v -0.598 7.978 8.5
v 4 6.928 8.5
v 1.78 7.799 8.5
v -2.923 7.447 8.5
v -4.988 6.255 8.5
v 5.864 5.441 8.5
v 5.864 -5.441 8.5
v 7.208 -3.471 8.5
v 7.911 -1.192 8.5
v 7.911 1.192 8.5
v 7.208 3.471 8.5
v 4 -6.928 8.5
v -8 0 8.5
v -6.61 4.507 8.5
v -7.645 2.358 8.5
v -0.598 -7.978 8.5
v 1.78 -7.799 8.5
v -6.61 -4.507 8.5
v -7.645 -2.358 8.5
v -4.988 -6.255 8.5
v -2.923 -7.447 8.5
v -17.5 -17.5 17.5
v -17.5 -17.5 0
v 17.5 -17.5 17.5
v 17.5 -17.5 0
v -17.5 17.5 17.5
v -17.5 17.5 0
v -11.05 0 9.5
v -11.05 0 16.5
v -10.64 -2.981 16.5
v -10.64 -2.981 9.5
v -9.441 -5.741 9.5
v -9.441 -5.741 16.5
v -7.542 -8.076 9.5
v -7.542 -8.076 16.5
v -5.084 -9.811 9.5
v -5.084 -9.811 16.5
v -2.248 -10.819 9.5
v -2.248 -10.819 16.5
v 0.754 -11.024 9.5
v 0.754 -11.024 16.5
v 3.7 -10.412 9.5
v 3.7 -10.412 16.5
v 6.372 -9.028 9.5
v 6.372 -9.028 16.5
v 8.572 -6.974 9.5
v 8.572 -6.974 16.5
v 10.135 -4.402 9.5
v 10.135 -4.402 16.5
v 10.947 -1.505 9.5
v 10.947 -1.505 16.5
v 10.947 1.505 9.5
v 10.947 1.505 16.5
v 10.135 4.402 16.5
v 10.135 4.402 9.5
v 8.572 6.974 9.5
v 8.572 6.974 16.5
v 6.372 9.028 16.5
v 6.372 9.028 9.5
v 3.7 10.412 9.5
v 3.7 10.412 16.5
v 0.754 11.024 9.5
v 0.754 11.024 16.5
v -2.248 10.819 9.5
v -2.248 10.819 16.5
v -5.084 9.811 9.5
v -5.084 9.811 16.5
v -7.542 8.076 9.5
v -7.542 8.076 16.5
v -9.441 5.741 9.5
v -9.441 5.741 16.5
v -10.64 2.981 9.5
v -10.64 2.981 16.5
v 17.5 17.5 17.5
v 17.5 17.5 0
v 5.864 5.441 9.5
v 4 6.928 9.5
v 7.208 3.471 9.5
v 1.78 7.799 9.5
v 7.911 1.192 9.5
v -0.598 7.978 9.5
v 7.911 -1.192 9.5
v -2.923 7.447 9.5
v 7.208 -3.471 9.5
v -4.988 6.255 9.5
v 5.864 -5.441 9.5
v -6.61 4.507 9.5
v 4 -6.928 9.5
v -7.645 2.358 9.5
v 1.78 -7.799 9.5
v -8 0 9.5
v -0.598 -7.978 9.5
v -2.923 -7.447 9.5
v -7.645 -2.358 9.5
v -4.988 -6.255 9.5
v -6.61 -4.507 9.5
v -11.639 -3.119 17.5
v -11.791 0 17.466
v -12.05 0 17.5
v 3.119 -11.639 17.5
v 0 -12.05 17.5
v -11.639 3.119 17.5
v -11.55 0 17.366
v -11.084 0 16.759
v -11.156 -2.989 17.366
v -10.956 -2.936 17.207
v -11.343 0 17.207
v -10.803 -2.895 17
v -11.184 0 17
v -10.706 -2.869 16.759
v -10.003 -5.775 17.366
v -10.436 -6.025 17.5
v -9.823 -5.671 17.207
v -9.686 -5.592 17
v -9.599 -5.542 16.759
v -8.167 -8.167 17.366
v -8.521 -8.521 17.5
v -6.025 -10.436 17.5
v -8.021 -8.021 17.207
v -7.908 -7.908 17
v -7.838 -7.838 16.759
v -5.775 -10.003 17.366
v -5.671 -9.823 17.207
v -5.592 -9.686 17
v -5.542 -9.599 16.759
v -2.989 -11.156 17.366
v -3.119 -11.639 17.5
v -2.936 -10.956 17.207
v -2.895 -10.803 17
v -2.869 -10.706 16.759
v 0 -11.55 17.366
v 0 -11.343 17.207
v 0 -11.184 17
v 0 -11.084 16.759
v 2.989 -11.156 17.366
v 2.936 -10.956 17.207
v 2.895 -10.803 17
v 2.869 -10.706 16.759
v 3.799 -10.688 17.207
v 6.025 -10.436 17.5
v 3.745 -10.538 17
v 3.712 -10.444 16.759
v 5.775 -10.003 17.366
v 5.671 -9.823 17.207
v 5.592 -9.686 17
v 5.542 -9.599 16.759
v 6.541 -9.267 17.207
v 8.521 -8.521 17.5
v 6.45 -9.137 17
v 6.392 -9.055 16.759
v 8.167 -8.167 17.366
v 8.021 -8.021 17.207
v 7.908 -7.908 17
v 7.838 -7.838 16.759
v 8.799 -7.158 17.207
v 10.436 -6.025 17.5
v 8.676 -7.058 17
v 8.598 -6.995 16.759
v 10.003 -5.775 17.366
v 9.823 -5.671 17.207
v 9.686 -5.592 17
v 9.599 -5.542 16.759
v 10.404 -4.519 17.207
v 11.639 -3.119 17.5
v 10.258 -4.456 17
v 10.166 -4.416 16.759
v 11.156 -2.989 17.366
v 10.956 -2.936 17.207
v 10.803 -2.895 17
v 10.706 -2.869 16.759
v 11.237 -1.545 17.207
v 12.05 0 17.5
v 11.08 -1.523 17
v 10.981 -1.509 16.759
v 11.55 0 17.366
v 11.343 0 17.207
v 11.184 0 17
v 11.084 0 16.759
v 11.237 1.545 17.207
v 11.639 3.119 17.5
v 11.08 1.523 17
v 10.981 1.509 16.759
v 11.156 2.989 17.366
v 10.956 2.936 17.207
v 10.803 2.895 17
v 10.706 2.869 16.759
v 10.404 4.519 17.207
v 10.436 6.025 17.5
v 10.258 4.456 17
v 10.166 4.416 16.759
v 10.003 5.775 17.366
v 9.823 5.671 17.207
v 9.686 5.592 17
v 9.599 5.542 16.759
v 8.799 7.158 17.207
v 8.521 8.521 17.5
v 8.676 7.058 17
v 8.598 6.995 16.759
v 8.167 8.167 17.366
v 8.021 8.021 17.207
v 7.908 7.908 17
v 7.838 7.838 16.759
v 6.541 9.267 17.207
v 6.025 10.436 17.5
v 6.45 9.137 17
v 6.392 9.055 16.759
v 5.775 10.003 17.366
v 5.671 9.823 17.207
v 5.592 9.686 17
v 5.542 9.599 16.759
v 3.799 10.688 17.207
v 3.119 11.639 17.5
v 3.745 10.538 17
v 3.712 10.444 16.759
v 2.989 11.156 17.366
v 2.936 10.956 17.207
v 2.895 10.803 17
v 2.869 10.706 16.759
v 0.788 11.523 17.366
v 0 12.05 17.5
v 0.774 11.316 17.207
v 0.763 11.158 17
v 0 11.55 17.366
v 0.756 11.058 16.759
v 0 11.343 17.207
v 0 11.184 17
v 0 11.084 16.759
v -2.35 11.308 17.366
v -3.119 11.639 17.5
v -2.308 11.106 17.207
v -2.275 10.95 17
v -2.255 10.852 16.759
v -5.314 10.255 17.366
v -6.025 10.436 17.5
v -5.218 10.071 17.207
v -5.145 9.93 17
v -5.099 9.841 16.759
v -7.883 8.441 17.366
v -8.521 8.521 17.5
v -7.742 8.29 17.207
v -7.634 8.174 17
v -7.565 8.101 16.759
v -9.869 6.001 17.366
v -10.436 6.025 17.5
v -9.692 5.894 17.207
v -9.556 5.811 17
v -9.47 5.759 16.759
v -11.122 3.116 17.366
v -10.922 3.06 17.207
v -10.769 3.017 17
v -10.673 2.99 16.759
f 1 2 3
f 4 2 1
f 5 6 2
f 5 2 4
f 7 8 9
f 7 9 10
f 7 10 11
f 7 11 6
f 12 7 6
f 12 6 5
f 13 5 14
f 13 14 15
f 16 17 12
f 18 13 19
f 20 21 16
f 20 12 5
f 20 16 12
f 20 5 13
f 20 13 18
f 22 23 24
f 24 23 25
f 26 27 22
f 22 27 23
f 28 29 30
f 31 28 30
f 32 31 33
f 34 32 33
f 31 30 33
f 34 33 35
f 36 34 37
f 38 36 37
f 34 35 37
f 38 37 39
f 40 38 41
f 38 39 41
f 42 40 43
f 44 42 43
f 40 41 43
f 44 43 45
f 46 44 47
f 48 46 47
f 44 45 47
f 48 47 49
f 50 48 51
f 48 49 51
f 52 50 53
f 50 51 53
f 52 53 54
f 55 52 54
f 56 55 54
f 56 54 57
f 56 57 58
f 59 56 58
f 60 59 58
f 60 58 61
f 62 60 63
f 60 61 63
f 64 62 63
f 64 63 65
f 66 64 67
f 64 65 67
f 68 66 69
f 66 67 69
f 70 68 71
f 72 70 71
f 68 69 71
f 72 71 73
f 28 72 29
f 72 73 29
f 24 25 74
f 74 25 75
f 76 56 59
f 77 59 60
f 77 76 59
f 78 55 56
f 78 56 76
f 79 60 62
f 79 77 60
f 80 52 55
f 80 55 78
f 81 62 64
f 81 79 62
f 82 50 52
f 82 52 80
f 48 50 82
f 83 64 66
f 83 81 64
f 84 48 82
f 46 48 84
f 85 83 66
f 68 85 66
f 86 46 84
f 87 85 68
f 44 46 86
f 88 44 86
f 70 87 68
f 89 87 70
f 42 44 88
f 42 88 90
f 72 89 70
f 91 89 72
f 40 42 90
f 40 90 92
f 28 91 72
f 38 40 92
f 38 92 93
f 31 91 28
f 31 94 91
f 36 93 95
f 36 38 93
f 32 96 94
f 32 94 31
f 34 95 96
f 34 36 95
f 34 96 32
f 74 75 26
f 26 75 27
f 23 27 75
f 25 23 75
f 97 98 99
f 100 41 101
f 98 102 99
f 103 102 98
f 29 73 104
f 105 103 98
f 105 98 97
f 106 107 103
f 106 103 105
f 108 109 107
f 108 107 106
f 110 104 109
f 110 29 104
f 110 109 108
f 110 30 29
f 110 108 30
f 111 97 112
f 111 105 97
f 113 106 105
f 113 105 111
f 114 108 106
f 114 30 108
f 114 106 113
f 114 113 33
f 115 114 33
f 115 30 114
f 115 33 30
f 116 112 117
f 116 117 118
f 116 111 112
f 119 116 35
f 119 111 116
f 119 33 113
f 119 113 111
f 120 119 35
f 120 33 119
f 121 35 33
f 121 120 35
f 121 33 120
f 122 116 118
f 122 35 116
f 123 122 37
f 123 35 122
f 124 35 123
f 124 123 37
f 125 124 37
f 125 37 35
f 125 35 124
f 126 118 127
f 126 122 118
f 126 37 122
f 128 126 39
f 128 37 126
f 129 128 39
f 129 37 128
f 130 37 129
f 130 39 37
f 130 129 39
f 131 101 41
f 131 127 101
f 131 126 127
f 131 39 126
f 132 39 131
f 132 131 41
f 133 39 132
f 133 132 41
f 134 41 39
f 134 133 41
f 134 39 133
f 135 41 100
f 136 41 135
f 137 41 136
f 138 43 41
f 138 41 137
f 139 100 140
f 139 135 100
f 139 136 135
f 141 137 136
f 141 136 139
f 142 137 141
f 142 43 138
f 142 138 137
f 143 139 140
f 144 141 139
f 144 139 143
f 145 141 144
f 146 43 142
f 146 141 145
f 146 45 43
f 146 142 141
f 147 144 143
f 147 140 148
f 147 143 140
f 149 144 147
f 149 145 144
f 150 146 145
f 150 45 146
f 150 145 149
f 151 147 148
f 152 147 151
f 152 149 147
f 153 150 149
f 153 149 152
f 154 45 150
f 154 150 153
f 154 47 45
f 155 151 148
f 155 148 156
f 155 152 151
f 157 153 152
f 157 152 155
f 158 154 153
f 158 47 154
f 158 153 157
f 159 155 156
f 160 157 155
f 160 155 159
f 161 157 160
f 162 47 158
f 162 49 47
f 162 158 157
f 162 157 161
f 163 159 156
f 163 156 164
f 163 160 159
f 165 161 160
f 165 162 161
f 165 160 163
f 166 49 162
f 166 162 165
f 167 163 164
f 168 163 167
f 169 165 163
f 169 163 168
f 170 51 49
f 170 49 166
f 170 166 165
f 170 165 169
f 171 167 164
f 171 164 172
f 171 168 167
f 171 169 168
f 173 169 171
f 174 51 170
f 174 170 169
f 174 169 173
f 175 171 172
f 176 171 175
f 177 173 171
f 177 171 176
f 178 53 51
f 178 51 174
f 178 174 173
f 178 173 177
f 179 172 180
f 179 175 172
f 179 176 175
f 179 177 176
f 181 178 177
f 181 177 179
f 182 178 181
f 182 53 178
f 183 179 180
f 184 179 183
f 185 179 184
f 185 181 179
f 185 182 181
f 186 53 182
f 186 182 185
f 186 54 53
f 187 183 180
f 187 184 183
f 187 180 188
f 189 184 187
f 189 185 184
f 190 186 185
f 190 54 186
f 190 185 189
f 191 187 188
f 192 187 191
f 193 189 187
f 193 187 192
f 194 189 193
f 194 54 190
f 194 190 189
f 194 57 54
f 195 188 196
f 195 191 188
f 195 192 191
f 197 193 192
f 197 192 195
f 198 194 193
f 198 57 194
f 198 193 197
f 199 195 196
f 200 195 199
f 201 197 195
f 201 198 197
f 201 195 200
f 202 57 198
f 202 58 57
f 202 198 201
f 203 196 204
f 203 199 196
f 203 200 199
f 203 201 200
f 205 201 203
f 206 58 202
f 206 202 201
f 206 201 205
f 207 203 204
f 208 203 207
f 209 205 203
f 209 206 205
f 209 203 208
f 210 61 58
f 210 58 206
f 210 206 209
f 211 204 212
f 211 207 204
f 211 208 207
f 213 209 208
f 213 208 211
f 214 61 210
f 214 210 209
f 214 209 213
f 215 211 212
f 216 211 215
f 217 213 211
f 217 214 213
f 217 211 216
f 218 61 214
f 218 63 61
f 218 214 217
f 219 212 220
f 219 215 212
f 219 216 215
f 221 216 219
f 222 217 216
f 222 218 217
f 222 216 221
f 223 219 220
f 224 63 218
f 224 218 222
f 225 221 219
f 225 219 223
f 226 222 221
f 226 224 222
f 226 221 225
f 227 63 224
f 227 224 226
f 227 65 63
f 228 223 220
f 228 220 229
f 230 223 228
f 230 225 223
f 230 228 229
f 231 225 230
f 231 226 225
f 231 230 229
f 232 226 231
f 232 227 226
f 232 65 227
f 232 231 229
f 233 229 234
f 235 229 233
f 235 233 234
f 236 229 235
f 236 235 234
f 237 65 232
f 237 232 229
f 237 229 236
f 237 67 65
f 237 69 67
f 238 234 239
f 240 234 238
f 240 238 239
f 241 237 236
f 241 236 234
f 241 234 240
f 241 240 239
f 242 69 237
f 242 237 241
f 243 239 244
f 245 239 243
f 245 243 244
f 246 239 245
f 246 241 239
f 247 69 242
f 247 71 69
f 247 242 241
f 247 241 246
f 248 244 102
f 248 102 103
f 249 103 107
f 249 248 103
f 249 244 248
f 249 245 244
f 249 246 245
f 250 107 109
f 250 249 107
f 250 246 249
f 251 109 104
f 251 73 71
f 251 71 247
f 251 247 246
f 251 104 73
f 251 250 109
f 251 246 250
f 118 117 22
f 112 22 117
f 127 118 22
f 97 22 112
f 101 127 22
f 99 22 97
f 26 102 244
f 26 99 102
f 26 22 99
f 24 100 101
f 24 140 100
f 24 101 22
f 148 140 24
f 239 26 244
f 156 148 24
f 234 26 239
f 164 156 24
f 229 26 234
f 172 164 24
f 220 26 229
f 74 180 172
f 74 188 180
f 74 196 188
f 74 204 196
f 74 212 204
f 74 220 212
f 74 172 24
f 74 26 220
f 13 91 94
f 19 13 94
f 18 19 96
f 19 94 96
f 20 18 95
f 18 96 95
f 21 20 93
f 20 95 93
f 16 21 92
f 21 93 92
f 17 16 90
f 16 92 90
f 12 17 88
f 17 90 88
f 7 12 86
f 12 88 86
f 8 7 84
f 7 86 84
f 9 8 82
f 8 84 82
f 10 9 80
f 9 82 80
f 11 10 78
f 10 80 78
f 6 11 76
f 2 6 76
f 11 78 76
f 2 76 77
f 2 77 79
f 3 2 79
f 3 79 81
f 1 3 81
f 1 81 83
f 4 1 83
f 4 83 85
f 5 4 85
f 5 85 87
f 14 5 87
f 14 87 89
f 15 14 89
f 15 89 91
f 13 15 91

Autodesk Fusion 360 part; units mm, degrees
sketch "Sketch2" plane through (0, 0, 0) normal (0, 0, 1) x (1, 0, 0)
  line L0 (17.5, 17.5) -> (-17.5, 17.5)
  line L1 (-17.5, 17.5) -> (-17.5, -17.5)
  line L2 (-17.5, -17.5) -> (17.5, -17.5)
  line L3 (17.5, -17.5) -> (17.5, 17.5)
  line L4 (17.5, 17.5) -> (-17.5, -17.5) construction
  line L5 (-17.5, 17.5) -> (17.5, -17.5) construction
  dimension "d10" = 35
  dimension "d11" = 35
extrude "Extrude2" add sketch "Sketch2" along normal blind 17.5
sketch "Sketch3" plane through (0, 0, 17.5) normal (0, 0, 1) x (-1, 0, 0)
  line L0 (-17.5, 17.5) -> (-17.5, -17.5)
  line L1 (-17.5, -17.5) -> (17.5, -17.5)
  line L2 (17.5, -17.5) -> (17.5, 17.5)
  line L3 (17.5, 17.5) -> (-17.5, 17.5)
  circle A0 centre (0, 0) radius 11.05
  dimension "d14" = 22.1
extrude "Extrude3" cut sketch "Sketch3" against normal blind 8 contours A0
sketch "Sketch4" plane through (0, 0, 9.5) normal (0, 0, 1) x (-1, 0, 0)
  circle A0 centre (0, 0) radius 11.05
  circle A1 centre (0, 0) radius 8
  dimension "d20" = 16
extrude "Extrude4" cut sketch "Sketch4" against normal blind 1 contours A1
sketch "Sketch5" plane through (0, 0, 8.5) normal (0, 0, 1) x (-1, 0, 0)
  circle A0 centre (0, 0) radius 8
  circle A1 centre (0, 0) radius 5
  dimension "d23" = 10
extrude "Extrude5" cut sketch "Sketch5" along normal through all contours A1
fillet "Fillet1" radius 1 1 edges at (10.3022, -3.9959, 17.5)
equation "TOL = 0.1 mm"
equation "BlockSize = 35 mm"
equation "d10 = BlockSize"
equation "d11 = BlockSize"
equation "d12 = BlockSize / 2"
equation "d14 = BearingOuter + TOL"
equation "d15 = -( BearingDepth + 1 mm )"
equation "BearingOuter = 22 mm"
equation "BearingInner = 8 mm"
equation "BearingWall = 2 mm"
equation "d20 = BearingOuter - BearingWall * 3"
equation "d23 = BearingInner + 2 mm"
equation "BearingDepth = 7 mm"
